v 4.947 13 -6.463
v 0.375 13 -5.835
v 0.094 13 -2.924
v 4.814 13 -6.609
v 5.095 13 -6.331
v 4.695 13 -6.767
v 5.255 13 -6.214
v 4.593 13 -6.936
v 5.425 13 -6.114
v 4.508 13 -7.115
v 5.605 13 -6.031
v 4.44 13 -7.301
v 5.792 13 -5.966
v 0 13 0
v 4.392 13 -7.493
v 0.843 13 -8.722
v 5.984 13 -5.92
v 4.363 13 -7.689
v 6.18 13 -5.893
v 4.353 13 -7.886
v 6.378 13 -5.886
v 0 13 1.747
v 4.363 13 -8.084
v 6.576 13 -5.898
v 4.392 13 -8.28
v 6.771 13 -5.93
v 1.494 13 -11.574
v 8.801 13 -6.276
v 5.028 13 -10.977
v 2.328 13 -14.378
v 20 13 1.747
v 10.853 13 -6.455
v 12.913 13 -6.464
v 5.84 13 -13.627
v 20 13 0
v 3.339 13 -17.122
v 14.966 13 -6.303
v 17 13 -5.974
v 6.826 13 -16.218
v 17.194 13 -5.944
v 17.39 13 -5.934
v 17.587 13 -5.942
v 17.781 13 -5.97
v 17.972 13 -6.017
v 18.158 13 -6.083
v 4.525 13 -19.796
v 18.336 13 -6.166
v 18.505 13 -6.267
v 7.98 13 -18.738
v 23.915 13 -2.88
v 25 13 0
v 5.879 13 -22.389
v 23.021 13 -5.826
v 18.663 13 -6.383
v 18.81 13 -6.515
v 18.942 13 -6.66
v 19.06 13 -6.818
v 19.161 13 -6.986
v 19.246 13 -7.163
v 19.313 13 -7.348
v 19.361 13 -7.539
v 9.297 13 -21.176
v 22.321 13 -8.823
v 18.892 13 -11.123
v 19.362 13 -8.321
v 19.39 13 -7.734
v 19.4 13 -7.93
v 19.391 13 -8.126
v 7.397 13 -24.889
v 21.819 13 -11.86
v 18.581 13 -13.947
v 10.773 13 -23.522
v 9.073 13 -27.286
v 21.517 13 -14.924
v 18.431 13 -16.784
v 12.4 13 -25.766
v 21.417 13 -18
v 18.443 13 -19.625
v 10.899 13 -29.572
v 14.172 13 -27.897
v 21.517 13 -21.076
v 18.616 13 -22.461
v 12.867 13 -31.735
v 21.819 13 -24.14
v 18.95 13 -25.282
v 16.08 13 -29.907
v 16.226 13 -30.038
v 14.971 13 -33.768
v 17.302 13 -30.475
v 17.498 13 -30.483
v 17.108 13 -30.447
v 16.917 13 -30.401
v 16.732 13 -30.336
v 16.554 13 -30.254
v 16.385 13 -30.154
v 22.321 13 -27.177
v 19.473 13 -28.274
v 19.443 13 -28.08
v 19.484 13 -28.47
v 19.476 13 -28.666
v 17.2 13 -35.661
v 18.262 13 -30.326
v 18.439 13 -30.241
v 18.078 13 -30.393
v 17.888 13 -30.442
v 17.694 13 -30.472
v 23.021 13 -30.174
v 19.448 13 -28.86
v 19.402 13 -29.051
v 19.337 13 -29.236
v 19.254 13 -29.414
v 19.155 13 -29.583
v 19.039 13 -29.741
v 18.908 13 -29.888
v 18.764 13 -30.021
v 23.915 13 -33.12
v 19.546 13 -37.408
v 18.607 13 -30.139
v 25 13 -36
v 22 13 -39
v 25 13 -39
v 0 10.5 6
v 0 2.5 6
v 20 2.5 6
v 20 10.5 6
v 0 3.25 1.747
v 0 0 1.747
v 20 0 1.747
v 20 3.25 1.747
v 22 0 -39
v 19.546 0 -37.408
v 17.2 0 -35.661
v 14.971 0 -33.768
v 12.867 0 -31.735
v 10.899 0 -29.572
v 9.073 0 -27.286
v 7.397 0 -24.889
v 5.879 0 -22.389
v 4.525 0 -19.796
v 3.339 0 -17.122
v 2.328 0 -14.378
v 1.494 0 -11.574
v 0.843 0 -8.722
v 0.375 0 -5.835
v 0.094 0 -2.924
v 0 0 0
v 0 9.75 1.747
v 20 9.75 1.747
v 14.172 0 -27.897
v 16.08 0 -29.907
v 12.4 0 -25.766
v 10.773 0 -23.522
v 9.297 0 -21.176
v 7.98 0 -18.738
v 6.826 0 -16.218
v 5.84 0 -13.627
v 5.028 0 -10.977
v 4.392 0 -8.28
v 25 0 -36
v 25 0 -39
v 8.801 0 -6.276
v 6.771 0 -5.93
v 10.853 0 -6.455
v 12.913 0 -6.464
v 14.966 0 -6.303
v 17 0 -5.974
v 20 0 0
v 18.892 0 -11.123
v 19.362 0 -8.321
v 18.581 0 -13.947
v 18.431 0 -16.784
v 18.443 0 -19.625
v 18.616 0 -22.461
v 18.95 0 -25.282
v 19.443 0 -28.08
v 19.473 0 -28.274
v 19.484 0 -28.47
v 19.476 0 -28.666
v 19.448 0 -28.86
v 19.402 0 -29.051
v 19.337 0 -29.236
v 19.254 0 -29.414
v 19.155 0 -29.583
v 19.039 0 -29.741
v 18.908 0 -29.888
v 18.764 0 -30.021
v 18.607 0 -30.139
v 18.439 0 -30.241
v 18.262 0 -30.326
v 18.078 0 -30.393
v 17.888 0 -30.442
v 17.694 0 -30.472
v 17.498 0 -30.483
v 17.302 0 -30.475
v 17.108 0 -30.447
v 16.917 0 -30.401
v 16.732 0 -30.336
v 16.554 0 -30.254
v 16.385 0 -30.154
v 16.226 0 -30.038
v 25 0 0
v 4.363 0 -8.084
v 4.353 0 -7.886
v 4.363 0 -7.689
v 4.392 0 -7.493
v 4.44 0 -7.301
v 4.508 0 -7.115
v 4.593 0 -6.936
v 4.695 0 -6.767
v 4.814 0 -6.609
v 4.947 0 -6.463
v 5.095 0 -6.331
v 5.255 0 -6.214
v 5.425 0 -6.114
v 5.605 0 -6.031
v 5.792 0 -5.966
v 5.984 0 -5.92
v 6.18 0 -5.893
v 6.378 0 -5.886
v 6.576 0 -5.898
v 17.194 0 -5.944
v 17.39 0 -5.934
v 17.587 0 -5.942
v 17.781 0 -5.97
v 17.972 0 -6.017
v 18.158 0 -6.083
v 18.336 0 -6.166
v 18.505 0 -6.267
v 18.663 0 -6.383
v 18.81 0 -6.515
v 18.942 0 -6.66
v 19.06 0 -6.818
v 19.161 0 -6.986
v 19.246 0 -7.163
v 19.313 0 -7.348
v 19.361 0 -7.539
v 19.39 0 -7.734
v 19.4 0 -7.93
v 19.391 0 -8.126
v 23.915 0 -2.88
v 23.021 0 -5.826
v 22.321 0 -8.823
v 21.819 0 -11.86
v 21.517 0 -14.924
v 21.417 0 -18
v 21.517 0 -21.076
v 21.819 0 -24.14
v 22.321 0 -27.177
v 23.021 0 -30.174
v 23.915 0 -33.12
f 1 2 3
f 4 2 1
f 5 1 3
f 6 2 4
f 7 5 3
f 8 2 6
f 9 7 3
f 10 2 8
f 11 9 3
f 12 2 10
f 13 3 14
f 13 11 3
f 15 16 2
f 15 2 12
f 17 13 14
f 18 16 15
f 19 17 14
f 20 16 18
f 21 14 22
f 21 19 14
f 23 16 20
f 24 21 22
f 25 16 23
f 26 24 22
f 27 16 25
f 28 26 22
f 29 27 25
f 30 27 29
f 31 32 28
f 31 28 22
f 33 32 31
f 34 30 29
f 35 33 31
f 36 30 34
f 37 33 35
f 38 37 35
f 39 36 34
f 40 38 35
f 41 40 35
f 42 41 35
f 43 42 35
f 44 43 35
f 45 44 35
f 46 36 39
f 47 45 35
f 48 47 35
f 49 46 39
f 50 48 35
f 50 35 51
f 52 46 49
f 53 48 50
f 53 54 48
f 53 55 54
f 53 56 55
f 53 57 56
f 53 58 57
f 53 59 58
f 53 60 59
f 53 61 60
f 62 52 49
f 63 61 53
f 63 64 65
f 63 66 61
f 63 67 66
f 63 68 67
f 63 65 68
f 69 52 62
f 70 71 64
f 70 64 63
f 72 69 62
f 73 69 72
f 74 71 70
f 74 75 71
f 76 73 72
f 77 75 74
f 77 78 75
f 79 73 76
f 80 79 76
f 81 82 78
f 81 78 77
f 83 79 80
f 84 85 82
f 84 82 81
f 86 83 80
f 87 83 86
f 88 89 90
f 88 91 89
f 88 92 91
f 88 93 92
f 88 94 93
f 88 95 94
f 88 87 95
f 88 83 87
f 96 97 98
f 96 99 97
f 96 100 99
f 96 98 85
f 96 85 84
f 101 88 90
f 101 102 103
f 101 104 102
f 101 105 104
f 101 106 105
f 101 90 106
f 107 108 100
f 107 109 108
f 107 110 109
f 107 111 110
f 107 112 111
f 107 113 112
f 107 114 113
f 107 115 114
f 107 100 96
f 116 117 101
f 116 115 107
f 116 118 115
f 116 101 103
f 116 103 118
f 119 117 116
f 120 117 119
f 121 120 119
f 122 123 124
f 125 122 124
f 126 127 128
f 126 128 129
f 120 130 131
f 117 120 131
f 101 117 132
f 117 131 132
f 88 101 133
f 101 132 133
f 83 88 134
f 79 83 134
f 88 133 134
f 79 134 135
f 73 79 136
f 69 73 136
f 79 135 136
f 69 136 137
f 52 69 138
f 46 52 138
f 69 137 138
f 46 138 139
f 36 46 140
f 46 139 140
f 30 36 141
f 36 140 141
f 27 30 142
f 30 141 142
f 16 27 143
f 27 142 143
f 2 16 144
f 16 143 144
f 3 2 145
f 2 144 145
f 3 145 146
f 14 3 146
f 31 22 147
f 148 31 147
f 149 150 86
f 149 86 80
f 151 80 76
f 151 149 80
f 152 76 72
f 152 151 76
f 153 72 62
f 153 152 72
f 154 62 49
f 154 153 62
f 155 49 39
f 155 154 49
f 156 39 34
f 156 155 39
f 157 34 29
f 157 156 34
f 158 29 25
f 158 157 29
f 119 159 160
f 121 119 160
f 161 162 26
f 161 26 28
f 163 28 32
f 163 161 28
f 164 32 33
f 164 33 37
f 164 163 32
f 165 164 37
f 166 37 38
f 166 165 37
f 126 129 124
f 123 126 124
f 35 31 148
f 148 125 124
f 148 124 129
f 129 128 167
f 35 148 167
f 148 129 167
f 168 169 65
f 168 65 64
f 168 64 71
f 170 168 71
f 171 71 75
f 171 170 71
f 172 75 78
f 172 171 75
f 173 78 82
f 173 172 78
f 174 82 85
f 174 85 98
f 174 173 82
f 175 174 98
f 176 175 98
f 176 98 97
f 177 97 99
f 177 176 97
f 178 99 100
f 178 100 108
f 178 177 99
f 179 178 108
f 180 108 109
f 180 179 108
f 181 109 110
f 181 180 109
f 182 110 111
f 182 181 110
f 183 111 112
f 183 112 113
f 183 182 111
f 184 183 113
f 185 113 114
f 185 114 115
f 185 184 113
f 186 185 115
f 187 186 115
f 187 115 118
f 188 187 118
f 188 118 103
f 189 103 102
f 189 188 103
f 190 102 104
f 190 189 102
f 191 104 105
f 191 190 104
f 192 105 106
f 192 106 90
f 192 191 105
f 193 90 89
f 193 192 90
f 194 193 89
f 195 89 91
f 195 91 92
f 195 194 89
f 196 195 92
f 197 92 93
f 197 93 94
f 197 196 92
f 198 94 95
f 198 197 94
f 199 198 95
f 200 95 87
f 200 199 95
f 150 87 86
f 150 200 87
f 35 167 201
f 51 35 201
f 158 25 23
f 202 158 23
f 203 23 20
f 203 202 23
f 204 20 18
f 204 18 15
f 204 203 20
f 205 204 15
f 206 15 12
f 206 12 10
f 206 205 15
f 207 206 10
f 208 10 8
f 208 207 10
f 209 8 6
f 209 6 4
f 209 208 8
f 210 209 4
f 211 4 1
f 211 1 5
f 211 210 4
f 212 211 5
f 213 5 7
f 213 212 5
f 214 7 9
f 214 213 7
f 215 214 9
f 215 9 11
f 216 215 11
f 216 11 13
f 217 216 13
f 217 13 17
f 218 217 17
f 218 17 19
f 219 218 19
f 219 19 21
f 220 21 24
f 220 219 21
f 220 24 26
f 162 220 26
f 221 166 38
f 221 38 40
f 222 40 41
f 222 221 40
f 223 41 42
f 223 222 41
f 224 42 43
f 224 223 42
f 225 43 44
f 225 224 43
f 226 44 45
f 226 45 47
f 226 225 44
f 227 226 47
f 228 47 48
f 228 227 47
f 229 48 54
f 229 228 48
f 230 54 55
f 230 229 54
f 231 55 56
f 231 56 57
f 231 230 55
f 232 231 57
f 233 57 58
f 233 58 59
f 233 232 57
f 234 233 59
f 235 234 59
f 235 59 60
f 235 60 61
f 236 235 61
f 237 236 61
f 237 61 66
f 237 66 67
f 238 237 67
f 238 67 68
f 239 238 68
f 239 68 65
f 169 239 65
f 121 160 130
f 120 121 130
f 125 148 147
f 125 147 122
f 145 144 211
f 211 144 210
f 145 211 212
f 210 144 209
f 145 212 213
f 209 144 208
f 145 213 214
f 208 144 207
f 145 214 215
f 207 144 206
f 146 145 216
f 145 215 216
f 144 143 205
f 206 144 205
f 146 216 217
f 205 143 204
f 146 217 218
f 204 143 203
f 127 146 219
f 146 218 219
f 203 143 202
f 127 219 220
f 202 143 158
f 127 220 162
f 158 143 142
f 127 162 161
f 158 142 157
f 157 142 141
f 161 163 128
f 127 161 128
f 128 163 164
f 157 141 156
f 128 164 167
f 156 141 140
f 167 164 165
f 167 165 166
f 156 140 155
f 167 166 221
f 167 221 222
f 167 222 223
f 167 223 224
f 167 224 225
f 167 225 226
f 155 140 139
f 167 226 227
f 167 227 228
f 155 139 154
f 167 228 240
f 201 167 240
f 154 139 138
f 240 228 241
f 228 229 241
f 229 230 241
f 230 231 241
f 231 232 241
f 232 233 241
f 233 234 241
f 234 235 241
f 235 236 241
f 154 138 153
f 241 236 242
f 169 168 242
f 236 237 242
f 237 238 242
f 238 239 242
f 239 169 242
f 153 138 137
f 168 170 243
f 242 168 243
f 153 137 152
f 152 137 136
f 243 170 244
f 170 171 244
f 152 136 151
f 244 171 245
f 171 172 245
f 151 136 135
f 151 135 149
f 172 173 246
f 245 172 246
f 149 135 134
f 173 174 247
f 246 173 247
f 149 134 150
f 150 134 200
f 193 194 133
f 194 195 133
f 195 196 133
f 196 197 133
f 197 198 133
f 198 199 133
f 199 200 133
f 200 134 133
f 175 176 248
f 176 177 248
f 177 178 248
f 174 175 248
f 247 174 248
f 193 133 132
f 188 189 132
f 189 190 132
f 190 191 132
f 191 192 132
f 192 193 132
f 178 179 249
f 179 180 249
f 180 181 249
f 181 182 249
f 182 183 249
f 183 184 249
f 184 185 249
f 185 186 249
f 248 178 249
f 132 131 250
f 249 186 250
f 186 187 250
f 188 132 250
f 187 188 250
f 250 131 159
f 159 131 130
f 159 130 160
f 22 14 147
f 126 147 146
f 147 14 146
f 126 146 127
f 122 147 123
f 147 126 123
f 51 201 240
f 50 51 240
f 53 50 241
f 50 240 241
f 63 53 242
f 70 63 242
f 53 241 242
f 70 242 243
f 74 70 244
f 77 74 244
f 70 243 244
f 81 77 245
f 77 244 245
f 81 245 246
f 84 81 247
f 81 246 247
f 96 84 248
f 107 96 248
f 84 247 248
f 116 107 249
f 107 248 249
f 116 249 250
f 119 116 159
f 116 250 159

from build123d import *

# Parameters (mm, degrees)
EXTRUDE_1_DEPTH     = 13
CUT_EXTRUDE_1_DEPTH = 49.114446895


with BuildPart() as part:
    # 草图1 → 凸台-拉伸1 (new body)
    with BuildSketch(Plane(origin=(0, 0, 0), x_dir=(1, 0, 0), z_dir=(0, 1, 0))):
        with BuildLine():
            Line((20, 0), (25, 0))
            ThreePointArc((25, 0), (21.416586692, 18), (25, 36))
            Line((25, 36), (25, 39))
            Line((25, 39), (22, 39))
            ThreePointArc((22, 39), (5.87927664, 22.388613177), (0, 0))
            Line((0, 0), (0, -6))
            Line((0, -6), (20, -6))
            Line((20, -6), (20, 0))
        make_face()
        with BuildLine():
            ThreePointArc((16.080059058, 29.907367254), (8.618420181, 19.967852036), (4.392399403, 8.279791209))
            ThreePointArc((4.392399403, 8.279791209), (4.947419472, 6.462870357), (6.770848151, 5.929619467))
            ThreePointArc((6.770848151, 5.929619467), (11.882919882, 6.480681597), (16.999608279, 5.974275931))
            ThreePointArc((16.999608279, 5.974275931), (18.809570487, 6.514692506), (19.362380146, 8.320908094))
            ThreePointArc((19.362380146, 8.320908094), (18.417004852, 18.204489029), (19.4431912, 28.080006643))
            ThreePointArc((19.4431912, 28.080006643), (18.439109127, 30.240549881), (16.080059058, 29.907367254))
        make_face(mode=Mode.SUBTRACT)
    extrude(amount=EXTRUDE_1_DEPTH)

    # 草图2 → 切除-拉伸1 (cut, through all)
    with BuildSketch(Plane.ZY):
        Polygon((1.746538635, 13), (1.746538635, 9.75), (6, 10.5), (6, 13), align=None)
        Polygon((6, 2.5), (6, 0), (1.746538635, 0), (1.746538635, 3.25), align=None)
    extrude(amount=-CUT_EXTRUDE_1_DEPTH, mode=Mode.SUBTRACT)


solid = part.part
